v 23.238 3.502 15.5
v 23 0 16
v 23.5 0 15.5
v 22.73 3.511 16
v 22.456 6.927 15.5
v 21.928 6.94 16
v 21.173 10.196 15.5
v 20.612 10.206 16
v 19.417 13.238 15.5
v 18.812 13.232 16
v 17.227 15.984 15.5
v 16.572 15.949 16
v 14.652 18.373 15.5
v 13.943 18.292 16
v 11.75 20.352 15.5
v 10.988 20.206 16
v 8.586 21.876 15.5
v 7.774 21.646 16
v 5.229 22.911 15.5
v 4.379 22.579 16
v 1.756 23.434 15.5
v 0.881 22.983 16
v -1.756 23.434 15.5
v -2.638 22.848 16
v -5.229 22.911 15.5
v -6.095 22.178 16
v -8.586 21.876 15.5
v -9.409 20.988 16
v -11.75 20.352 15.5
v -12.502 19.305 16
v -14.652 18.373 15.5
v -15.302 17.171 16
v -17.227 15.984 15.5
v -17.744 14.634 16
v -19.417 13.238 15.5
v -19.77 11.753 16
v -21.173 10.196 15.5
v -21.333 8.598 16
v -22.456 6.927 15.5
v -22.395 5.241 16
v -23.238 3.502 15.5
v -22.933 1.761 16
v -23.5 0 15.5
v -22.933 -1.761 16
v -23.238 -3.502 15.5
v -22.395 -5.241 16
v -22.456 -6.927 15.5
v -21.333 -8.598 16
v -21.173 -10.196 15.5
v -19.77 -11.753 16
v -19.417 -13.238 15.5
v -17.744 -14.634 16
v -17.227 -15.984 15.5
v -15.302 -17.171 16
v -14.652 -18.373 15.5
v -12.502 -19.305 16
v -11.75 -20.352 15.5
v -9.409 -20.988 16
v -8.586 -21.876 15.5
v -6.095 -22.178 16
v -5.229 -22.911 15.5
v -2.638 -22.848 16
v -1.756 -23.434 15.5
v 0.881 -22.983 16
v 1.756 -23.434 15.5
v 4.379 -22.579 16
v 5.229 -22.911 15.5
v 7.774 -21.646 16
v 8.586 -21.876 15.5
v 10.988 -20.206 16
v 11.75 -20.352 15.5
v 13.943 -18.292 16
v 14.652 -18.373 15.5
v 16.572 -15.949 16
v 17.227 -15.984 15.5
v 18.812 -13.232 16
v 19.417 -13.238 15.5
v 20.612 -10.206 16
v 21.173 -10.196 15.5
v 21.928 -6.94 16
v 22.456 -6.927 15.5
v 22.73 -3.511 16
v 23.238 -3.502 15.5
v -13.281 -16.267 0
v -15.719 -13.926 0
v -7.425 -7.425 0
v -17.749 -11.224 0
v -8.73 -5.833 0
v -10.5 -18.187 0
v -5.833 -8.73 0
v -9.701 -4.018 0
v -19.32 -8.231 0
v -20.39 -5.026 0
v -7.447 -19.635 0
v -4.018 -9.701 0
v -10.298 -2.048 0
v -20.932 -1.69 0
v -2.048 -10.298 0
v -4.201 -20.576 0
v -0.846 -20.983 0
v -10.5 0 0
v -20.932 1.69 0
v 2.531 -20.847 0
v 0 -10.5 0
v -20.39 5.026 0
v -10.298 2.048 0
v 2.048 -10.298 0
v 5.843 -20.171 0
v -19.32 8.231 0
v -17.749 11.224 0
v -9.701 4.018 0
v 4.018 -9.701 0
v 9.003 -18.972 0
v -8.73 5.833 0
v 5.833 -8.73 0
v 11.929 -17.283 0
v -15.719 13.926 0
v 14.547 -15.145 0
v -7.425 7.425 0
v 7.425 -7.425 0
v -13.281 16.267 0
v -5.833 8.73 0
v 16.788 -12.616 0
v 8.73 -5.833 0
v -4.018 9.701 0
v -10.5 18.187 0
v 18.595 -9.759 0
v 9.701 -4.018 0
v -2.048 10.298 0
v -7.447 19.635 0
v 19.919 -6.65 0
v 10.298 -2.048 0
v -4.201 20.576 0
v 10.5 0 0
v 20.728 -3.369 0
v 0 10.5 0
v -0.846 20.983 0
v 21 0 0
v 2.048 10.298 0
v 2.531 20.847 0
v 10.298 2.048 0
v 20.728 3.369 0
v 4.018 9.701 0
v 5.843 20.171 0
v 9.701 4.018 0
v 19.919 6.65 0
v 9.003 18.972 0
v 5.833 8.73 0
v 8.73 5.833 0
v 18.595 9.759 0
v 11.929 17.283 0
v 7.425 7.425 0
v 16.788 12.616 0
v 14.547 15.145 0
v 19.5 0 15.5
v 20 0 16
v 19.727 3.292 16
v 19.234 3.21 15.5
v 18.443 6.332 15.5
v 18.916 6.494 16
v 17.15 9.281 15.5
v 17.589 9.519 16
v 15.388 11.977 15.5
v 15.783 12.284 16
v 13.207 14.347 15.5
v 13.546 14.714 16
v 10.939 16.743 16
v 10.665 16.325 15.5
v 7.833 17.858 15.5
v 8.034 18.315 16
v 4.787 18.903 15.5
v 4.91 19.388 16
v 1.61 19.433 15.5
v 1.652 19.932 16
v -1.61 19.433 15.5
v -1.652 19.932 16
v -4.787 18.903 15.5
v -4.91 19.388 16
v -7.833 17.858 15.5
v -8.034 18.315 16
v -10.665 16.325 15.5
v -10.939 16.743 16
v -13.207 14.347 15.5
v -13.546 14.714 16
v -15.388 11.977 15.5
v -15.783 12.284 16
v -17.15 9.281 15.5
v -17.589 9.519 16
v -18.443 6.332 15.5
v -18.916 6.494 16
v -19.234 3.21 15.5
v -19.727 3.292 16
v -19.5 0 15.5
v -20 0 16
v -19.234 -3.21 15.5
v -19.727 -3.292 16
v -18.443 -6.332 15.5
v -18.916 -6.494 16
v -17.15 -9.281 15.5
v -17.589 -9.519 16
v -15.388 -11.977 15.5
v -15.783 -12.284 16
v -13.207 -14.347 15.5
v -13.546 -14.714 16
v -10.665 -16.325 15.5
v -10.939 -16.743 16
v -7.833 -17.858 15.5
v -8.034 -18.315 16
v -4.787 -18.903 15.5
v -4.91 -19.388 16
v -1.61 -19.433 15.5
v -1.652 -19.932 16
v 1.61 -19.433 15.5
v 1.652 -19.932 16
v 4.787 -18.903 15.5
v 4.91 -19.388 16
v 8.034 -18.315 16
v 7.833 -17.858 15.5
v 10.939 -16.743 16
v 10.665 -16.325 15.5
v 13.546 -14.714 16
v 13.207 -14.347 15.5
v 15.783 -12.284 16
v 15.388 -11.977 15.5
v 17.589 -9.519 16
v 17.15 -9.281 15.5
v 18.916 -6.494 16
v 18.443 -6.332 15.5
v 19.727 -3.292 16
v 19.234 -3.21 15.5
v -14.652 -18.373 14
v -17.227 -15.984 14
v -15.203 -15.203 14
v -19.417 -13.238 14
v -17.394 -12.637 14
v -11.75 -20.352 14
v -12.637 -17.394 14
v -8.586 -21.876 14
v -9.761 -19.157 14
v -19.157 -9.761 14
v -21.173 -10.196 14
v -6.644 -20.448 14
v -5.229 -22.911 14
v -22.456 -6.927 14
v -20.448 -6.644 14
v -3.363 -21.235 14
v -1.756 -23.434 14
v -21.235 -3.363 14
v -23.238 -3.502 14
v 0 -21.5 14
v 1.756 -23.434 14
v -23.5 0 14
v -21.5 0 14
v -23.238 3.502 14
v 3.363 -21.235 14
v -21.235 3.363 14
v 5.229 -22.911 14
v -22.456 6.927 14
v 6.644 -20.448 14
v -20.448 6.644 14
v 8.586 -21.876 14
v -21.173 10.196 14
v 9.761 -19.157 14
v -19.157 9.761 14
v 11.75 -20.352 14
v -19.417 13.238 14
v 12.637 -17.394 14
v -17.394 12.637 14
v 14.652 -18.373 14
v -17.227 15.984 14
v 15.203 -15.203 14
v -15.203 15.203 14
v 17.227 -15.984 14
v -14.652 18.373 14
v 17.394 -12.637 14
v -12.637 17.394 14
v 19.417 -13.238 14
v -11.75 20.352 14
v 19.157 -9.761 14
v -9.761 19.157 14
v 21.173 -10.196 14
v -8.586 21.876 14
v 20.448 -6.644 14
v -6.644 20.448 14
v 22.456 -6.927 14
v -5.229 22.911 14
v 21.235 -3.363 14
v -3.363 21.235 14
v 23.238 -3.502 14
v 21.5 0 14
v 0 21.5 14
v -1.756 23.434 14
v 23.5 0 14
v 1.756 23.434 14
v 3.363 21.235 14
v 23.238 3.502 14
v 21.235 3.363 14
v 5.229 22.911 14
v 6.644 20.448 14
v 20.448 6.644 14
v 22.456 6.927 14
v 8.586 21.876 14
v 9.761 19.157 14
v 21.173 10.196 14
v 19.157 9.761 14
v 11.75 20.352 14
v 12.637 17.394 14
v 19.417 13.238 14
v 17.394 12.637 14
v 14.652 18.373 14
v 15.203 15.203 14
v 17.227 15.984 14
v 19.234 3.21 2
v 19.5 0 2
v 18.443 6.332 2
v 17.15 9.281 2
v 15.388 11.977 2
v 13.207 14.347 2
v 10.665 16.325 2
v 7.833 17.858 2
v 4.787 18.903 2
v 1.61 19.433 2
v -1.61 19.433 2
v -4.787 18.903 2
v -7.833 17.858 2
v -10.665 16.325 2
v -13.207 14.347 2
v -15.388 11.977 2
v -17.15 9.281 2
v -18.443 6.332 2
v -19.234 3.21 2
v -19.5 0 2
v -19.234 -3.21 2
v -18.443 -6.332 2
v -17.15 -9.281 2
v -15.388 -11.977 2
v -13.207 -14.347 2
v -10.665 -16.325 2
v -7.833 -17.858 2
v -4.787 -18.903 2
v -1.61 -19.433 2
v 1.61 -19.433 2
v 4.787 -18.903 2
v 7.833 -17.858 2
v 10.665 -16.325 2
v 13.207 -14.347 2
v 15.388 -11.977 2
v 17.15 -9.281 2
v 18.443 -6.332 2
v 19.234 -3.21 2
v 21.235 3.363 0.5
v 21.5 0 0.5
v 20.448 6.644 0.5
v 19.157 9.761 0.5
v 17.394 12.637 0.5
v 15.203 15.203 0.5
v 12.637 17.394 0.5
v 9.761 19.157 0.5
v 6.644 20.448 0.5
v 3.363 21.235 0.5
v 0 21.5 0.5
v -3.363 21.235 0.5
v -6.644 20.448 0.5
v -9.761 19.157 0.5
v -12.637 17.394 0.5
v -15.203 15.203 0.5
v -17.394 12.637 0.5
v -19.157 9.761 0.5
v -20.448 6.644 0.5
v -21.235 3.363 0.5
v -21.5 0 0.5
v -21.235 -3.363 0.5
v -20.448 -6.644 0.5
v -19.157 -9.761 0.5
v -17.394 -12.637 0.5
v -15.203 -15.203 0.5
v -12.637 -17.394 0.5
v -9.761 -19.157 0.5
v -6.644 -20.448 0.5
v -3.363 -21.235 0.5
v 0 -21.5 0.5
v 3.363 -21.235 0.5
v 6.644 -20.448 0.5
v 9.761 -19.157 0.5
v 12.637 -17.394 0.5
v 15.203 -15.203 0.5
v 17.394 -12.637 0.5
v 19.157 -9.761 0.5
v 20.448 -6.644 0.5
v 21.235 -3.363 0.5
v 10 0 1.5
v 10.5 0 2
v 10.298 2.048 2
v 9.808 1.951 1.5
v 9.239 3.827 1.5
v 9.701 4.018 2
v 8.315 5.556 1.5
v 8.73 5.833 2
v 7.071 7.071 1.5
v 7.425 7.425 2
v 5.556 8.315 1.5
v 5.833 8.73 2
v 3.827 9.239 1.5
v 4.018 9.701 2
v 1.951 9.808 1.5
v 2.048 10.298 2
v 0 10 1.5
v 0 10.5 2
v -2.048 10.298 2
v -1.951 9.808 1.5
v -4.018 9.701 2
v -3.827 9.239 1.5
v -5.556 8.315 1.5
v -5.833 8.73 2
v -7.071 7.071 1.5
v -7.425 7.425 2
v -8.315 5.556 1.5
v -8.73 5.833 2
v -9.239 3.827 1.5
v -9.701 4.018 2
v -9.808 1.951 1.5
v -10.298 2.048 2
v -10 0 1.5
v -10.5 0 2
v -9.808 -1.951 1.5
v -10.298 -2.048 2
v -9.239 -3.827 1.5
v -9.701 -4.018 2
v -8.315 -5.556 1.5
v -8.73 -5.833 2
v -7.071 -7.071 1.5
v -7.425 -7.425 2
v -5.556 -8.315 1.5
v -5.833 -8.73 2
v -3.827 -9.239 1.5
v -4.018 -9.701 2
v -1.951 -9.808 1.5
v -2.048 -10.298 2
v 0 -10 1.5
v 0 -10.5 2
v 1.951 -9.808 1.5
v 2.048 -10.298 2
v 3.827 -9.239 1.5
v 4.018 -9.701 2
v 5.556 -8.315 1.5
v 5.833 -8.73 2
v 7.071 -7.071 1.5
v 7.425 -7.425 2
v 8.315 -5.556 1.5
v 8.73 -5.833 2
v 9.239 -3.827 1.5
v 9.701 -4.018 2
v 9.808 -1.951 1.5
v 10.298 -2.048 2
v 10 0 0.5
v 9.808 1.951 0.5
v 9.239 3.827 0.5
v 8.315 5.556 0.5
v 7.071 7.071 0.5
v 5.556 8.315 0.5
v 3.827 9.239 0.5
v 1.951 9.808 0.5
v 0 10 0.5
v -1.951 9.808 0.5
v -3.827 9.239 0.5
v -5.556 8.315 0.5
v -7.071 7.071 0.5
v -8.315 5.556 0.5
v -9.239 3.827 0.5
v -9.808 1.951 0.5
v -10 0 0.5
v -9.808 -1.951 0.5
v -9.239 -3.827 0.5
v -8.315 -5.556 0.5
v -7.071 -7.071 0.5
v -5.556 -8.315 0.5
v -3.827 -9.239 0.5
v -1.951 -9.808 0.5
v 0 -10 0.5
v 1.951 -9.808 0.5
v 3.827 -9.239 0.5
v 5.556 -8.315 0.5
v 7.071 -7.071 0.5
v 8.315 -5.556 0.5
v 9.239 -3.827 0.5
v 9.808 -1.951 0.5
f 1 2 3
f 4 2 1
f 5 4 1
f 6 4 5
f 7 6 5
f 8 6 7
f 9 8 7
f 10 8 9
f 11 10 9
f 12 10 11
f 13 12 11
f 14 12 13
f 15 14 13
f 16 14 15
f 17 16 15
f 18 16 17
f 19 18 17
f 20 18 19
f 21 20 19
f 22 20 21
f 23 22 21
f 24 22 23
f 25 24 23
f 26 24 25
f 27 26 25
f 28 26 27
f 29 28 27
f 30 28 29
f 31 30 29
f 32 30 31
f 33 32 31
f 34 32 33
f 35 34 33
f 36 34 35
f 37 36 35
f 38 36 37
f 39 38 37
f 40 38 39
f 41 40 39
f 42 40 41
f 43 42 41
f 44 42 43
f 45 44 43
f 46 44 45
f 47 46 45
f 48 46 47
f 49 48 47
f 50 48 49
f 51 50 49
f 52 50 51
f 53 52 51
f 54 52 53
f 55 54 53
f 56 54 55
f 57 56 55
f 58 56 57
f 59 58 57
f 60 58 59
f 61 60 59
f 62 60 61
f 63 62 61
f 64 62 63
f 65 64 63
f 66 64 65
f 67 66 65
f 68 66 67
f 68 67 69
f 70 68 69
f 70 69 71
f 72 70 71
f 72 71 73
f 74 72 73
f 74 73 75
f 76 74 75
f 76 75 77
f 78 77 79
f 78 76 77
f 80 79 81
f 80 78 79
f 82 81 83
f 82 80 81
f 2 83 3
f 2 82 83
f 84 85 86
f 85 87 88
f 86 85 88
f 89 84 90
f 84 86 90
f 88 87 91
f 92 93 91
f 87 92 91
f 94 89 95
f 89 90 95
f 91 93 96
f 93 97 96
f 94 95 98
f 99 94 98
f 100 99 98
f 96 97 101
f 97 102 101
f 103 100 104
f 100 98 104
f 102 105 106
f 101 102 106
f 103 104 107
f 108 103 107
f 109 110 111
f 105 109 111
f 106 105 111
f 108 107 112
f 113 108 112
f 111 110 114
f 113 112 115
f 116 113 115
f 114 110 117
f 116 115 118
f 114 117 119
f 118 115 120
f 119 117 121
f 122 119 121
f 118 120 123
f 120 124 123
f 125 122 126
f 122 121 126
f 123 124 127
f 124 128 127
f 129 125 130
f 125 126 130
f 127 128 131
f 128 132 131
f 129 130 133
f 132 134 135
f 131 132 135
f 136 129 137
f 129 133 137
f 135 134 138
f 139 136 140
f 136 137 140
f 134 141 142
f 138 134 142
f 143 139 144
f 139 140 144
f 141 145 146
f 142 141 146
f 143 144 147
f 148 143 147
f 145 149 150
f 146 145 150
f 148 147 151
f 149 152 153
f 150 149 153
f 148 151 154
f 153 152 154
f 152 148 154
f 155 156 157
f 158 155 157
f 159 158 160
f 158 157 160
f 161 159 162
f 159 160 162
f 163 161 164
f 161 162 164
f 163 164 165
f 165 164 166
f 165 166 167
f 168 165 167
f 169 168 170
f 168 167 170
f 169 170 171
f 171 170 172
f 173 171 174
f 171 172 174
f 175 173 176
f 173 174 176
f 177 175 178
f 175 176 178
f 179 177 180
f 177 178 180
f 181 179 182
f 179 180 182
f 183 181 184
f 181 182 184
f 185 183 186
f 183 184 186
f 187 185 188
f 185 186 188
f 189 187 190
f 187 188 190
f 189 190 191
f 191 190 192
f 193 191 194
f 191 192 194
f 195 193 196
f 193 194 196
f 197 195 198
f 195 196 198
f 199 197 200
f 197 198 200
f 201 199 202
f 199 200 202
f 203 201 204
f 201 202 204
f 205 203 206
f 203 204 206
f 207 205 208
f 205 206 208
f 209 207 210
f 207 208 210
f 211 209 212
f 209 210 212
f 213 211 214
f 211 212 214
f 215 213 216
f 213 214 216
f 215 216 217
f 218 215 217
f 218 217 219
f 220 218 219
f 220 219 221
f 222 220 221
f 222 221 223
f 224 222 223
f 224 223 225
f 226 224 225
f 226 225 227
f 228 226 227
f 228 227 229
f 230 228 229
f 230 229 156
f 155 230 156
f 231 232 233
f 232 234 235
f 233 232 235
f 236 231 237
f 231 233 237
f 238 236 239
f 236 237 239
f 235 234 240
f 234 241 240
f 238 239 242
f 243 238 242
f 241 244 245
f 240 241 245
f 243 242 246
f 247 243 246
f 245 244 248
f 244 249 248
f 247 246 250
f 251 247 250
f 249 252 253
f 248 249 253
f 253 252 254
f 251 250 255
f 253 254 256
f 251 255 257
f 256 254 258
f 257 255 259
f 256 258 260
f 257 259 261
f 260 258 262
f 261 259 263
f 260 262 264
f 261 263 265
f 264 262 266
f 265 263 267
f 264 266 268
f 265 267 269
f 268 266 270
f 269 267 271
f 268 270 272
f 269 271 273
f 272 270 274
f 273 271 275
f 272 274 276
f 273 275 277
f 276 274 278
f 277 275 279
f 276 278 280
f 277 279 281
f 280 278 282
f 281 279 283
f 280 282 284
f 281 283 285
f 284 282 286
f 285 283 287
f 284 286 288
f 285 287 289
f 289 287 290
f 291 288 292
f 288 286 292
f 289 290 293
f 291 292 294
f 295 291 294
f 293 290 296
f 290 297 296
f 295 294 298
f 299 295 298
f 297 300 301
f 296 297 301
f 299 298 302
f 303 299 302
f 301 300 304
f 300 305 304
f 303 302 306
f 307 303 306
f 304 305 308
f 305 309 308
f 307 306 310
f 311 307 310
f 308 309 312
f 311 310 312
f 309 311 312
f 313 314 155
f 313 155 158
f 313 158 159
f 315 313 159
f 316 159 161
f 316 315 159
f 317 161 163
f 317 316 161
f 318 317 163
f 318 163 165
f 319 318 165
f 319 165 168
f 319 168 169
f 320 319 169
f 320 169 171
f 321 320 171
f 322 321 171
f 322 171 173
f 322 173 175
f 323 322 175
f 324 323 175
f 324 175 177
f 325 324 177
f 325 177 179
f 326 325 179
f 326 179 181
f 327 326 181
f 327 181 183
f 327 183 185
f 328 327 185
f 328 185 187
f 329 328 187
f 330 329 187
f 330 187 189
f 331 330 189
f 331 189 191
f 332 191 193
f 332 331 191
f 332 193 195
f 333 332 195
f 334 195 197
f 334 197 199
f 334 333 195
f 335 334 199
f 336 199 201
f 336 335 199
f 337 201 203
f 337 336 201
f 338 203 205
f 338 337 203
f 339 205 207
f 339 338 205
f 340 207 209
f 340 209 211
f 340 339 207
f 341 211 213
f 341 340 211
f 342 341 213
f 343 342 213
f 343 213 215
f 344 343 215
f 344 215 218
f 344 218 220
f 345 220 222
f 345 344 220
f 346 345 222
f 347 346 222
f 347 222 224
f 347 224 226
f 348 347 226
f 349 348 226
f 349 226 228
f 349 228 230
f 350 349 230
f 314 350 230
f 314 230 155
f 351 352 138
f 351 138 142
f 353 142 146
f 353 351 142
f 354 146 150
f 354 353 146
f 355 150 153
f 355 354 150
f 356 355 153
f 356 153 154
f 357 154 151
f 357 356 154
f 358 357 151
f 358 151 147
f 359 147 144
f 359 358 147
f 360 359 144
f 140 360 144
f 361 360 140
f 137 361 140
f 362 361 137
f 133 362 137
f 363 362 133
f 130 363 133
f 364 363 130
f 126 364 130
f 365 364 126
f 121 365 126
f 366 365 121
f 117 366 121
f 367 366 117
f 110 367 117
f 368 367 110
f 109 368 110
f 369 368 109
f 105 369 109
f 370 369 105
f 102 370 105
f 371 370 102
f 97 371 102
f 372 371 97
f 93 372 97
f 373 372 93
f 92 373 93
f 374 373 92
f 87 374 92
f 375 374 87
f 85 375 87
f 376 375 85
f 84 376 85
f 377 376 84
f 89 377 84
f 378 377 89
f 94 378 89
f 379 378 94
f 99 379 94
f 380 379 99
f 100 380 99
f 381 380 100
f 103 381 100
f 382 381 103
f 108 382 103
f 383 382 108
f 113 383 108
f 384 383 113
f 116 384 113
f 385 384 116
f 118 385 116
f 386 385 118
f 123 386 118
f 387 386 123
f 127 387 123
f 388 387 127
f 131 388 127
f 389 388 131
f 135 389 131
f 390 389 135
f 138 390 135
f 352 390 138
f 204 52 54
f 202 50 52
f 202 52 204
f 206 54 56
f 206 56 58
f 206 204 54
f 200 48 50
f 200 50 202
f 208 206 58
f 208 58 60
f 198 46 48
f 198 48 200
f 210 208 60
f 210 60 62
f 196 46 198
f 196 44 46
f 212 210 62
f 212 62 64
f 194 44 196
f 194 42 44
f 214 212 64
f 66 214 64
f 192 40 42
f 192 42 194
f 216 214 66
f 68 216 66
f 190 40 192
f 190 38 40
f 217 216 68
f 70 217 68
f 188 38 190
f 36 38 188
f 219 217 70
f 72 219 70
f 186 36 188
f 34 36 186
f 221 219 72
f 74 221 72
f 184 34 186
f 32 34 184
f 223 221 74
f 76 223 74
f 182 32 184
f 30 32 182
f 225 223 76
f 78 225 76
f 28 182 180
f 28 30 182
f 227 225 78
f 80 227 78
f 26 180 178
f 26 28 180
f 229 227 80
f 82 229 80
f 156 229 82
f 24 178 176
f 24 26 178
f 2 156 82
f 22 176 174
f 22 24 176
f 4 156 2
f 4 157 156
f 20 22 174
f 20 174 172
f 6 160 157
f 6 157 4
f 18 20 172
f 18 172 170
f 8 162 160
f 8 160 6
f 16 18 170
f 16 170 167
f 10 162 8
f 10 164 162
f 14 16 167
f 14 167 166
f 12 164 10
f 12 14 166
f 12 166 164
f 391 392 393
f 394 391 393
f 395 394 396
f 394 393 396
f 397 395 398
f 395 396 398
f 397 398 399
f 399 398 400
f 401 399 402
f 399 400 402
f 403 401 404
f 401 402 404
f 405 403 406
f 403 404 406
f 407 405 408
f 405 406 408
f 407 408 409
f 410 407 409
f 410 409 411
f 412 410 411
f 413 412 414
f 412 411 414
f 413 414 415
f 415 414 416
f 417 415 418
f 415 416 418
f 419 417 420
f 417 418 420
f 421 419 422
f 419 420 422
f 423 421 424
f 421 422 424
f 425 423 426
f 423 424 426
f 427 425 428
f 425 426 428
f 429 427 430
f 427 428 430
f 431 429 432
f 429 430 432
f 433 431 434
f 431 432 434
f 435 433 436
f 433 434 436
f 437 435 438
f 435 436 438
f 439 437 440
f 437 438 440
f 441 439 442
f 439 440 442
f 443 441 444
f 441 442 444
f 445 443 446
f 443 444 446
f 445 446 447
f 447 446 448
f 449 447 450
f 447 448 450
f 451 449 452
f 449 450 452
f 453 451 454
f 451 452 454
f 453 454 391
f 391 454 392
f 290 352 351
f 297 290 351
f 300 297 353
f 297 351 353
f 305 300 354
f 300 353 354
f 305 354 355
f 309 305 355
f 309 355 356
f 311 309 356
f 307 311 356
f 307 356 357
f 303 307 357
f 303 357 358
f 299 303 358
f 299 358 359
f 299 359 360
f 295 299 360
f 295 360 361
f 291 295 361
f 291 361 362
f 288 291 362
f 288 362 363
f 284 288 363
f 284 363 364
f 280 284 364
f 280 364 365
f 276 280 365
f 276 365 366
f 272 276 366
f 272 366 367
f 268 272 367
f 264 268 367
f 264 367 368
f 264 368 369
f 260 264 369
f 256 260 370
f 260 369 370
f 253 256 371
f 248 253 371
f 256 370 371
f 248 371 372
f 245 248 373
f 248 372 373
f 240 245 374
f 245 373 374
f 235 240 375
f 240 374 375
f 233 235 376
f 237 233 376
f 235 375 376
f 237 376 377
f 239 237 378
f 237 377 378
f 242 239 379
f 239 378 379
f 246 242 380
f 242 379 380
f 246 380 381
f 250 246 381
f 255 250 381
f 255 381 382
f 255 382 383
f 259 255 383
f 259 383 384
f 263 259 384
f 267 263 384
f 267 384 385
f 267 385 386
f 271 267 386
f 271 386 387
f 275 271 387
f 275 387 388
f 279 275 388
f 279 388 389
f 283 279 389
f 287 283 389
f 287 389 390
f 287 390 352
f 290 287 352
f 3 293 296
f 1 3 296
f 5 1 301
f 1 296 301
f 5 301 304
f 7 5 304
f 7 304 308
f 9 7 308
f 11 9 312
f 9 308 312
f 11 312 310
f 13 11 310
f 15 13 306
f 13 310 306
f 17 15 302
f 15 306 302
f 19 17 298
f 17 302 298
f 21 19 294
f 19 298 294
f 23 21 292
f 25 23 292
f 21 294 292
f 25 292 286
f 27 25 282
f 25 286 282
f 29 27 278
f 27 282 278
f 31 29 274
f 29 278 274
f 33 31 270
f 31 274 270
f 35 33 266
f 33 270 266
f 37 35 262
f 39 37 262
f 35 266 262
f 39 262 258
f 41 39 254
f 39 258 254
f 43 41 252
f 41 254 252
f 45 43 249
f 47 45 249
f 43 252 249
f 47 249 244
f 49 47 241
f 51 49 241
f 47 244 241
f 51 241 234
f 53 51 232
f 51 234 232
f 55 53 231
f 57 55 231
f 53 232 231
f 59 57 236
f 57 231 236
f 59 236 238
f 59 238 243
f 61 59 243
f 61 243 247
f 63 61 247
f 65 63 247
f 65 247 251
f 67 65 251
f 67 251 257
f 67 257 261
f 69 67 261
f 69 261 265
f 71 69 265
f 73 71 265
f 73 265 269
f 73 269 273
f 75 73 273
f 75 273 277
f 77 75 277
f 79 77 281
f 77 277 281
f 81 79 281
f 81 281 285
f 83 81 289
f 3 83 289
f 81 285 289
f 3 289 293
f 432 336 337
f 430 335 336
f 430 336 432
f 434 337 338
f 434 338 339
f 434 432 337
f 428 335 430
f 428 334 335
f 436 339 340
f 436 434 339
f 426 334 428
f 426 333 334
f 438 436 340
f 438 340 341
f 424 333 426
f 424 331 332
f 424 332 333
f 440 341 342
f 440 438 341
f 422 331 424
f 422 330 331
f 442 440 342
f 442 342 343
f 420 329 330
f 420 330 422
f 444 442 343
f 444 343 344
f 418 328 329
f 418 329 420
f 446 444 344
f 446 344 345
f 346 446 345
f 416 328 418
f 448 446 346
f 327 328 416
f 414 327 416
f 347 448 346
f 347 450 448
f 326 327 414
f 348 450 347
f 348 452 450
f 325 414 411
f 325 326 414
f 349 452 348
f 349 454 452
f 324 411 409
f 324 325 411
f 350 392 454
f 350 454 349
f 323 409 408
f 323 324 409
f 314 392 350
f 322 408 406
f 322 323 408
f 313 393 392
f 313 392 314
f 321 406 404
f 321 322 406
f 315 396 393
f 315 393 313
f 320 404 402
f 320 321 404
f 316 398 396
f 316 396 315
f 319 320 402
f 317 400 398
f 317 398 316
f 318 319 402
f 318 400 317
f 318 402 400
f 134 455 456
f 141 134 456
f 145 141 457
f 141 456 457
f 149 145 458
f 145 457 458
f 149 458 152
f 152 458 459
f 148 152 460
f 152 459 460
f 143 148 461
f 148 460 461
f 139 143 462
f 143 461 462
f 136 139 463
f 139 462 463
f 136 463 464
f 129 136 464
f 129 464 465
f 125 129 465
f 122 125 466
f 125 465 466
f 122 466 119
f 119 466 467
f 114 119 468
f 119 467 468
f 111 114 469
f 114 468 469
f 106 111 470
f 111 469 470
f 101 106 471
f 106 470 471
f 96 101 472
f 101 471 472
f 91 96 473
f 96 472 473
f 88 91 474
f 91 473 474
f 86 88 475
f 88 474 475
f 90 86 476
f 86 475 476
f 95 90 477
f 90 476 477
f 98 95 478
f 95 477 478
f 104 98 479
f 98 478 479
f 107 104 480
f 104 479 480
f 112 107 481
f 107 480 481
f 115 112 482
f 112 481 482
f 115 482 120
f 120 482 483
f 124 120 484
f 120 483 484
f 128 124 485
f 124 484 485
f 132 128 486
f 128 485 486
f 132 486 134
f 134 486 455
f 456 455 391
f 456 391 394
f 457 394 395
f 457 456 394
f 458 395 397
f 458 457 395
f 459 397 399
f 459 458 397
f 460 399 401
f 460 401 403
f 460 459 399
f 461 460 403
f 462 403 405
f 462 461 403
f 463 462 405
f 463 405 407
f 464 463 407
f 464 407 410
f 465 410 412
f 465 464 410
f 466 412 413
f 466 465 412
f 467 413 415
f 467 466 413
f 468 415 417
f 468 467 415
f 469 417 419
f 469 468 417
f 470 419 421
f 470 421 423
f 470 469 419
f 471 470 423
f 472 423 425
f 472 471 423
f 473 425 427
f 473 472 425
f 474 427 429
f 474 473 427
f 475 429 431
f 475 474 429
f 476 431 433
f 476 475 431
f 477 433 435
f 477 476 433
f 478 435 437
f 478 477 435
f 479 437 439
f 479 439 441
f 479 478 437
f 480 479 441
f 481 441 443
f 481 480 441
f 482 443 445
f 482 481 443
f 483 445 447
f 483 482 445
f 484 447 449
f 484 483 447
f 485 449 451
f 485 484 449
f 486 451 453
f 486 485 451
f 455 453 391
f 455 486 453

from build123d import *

# Parameters (mm, degrees)
F0_R     = 21.5
F0_R_2   = 10
F1_DEPTH = 2
F2_R     = 21.5
F2_R_2   = 19.5
F3_DEPTH = 12
F4_R     = 23.5
F4_R_2   = 21.5
F4_R_3   = 19.5
F5_DEPTH = 2
F6_SIZE  = 0.5
F7_SIZE  = 0.5
F8_SIZE  = 0.5


with BuildPart() as f1:
    # F0 (on Top) → F1 (new body)
    with BuildSketch(Plane.XY):
        Circle(F0_R)
        Circle(F0_R_2, mode=Mode.SUBTRACT)
    extrude(amount=F1_DEPTH)

    # F2 (on face) → F3 (join)
    with BuildSketch(Plane.XY.offset(2)):
        Circle(F2_R)
        Circle(F2_R_2, mode=Mode.SUBTRACT)
    extrude(amount=F3_DEPTH)

    # F4 (on face) → F5 (join)
    with BuildSketch(Plane.XY.offset(14)):
        Circle(F4_R)
        Circle(F4_R_2, mode=Mode.SUBTRACT)
        Circle(F4_R_2)
        Circle(F4_R_3, mode=Mode.SUBTRACT)
    extrude(amount=F5_DEPTH)

    # F6
    f6_edges = [f1.edges().sort_by_distance(p)[0] for p in [
        (-21.5, 0, 0),
    ]]
    chamfer(f6_edges, length=F6_SIZE)

    # F7
    f7_edges = [f1.edges().sort_by_distance(p)[0] for p in [
        (-10, 0, 2),
        (-10, 0, 0),
    ]]
    chamfer(f7_edges, length=F7_SIZE)

    # F8
    f8_edges = [f1.edges().sort_by_distance(p)[0] for p in [
        (-23.5, 0, 16),
        (-19.5, 0, 16),
    ]]
    chamfer(f8_edges, length=F8_SIZE)


solid = f1.part
